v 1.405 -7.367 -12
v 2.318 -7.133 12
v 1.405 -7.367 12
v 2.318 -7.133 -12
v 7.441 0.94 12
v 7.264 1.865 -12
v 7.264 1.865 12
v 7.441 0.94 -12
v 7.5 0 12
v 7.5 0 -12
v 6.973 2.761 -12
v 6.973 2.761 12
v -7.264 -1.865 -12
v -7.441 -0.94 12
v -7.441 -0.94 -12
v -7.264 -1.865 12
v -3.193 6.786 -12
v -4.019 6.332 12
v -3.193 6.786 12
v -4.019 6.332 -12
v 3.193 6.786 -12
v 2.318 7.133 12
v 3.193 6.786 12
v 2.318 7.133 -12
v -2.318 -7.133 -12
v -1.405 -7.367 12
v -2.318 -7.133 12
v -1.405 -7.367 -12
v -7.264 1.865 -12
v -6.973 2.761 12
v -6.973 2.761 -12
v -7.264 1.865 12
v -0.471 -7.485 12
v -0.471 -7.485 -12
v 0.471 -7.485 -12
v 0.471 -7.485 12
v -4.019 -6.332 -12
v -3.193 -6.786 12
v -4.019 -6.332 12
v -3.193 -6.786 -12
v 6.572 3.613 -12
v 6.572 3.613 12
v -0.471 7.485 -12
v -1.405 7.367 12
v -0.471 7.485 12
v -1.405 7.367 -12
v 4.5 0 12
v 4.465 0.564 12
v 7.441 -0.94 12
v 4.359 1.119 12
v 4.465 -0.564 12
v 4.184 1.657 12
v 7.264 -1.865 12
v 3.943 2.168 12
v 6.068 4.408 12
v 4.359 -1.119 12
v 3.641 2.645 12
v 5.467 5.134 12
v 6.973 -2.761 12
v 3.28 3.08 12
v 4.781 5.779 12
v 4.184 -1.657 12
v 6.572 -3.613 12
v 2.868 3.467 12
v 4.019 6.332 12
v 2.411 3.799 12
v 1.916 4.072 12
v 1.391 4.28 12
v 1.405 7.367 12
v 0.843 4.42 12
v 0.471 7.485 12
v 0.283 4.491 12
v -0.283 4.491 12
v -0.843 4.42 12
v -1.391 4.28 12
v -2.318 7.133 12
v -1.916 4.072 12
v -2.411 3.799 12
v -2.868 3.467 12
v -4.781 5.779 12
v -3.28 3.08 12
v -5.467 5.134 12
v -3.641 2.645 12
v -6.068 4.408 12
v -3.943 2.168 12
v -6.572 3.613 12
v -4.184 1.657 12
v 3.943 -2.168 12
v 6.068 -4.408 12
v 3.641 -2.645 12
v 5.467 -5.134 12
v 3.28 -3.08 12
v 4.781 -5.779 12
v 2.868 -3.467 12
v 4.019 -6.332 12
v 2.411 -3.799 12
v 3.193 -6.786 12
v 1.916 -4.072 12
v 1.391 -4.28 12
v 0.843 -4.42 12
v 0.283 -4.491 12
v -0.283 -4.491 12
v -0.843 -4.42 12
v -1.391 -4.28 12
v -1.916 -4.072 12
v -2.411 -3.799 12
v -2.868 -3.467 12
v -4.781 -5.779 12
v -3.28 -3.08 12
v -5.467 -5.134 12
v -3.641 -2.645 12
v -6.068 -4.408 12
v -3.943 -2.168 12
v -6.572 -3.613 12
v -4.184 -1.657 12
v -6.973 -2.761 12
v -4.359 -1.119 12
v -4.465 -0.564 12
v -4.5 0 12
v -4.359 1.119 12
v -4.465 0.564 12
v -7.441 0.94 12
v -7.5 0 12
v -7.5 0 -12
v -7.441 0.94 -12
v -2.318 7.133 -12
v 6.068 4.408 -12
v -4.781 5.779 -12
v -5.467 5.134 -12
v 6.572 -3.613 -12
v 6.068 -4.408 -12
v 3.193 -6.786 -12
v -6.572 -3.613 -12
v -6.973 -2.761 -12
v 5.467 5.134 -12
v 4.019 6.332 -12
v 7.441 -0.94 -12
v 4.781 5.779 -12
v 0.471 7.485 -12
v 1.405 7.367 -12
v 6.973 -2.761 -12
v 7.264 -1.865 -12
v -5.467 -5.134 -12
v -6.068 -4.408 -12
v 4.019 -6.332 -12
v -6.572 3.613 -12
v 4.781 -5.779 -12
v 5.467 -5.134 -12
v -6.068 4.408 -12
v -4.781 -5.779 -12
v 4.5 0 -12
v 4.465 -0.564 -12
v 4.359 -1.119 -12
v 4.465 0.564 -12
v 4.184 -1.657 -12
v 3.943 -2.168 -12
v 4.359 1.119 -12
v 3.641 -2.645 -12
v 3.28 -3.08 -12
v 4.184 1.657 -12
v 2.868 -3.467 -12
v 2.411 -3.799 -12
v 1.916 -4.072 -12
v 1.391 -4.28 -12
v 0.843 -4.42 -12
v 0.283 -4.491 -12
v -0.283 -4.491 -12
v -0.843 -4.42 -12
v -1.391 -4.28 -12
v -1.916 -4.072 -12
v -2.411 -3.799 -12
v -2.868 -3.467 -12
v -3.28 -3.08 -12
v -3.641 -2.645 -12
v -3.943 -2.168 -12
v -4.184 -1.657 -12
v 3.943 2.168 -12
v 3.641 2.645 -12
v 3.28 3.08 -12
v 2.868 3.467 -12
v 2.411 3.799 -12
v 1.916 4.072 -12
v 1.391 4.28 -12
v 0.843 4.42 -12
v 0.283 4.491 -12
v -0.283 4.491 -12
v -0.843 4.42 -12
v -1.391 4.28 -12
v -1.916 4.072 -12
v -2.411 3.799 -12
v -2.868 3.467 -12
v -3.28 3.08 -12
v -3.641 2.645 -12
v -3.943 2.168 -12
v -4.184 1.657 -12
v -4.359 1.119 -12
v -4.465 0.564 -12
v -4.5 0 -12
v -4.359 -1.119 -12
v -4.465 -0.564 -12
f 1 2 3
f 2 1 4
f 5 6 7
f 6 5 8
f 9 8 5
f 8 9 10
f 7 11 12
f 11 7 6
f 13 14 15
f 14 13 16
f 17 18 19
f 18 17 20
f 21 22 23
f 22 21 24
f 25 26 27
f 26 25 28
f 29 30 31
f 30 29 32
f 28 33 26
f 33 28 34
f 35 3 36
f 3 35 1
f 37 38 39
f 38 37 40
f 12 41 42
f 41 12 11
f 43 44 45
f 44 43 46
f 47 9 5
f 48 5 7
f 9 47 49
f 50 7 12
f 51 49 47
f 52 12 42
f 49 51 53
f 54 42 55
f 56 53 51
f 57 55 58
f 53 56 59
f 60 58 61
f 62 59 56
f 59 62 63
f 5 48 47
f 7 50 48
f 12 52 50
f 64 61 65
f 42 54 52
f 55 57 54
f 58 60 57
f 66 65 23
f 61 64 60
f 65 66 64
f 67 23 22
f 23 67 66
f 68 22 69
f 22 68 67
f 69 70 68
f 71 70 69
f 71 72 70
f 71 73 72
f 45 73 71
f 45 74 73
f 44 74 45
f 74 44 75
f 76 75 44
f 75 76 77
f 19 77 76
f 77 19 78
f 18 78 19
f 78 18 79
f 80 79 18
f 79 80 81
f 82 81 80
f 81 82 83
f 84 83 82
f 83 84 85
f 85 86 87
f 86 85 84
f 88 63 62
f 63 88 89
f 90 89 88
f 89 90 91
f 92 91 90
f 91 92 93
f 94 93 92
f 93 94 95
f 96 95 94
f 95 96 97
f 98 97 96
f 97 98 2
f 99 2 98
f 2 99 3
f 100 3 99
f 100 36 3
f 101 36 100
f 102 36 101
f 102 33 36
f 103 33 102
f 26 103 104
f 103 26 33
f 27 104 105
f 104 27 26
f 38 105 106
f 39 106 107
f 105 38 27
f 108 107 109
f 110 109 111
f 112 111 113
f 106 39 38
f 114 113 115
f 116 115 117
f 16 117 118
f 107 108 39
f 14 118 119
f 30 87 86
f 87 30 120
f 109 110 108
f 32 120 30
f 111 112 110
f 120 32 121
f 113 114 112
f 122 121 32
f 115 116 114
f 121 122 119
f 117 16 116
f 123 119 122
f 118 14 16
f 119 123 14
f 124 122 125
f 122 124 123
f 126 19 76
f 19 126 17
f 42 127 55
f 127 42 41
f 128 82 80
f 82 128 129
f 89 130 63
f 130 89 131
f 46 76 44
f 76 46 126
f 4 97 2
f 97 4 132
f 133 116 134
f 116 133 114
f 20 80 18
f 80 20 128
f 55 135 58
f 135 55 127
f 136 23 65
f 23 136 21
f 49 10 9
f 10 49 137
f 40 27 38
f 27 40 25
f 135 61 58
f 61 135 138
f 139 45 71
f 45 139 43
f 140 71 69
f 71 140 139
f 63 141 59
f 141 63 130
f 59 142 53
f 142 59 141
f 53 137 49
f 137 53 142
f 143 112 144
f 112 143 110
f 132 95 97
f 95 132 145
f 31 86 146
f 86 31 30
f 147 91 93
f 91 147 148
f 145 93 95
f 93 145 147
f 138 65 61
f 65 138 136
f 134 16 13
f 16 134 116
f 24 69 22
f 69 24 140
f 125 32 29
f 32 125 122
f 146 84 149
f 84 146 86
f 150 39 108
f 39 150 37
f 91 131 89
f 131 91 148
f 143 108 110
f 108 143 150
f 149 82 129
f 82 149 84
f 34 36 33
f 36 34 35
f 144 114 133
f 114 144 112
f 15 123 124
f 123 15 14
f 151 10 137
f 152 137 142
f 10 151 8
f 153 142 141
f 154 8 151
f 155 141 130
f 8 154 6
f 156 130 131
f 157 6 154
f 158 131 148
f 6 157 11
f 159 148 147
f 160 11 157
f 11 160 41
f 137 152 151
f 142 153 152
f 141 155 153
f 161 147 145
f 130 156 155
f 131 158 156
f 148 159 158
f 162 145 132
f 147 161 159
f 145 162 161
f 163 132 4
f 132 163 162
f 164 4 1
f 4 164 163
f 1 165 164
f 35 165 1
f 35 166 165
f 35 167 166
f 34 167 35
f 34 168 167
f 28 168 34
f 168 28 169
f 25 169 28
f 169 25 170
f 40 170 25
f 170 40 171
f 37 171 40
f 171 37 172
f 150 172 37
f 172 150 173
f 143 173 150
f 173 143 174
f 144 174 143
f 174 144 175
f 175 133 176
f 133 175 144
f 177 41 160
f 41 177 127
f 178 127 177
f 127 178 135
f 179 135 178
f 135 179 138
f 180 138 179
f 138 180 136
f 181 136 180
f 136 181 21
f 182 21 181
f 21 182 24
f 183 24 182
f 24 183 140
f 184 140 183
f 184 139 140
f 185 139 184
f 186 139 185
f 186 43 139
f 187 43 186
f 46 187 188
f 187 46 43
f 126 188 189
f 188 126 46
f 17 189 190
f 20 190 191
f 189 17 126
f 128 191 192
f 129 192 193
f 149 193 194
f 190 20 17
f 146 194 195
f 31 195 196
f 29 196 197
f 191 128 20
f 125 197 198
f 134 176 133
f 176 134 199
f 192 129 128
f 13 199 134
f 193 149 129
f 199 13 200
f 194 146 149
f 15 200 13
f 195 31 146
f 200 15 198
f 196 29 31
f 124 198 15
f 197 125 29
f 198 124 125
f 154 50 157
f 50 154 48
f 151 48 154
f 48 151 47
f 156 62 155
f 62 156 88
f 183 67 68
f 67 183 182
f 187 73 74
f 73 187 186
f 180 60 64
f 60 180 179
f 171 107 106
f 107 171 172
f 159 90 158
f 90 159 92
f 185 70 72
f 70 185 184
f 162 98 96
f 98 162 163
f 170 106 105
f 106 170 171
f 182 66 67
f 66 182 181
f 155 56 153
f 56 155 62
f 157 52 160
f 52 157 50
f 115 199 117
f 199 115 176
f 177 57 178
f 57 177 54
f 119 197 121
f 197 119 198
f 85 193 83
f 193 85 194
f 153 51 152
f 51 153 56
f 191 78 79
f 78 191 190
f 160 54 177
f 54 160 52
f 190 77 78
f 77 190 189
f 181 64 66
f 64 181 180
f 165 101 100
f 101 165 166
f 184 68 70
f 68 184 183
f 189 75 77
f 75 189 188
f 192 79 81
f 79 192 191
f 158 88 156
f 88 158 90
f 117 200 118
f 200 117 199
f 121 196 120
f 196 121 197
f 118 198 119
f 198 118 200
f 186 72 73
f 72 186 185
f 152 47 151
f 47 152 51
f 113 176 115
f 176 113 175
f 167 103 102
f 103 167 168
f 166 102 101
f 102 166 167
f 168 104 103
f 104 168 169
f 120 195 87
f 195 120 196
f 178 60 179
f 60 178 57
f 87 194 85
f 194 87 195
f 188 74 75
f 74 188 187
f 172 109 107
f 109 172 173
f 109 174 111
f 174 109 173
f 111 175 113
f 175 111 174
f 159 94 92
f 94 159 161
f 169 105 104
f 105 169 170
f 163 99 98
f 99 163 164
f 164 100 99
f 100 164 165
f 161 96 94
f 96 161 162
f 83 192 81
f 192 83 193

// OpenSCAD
$fn = 50;


difference() {
	union() {
		translate(v = [0, 0, -12.0000000000]) {
			cylinder(h = 24, r = 7.5000000000);
		}
	}
	union() {
		translate(v = [0, 0, -100.0000000000]) {
			cylinder(h = 200, r = 4.5000000000);
		}
	}
}
